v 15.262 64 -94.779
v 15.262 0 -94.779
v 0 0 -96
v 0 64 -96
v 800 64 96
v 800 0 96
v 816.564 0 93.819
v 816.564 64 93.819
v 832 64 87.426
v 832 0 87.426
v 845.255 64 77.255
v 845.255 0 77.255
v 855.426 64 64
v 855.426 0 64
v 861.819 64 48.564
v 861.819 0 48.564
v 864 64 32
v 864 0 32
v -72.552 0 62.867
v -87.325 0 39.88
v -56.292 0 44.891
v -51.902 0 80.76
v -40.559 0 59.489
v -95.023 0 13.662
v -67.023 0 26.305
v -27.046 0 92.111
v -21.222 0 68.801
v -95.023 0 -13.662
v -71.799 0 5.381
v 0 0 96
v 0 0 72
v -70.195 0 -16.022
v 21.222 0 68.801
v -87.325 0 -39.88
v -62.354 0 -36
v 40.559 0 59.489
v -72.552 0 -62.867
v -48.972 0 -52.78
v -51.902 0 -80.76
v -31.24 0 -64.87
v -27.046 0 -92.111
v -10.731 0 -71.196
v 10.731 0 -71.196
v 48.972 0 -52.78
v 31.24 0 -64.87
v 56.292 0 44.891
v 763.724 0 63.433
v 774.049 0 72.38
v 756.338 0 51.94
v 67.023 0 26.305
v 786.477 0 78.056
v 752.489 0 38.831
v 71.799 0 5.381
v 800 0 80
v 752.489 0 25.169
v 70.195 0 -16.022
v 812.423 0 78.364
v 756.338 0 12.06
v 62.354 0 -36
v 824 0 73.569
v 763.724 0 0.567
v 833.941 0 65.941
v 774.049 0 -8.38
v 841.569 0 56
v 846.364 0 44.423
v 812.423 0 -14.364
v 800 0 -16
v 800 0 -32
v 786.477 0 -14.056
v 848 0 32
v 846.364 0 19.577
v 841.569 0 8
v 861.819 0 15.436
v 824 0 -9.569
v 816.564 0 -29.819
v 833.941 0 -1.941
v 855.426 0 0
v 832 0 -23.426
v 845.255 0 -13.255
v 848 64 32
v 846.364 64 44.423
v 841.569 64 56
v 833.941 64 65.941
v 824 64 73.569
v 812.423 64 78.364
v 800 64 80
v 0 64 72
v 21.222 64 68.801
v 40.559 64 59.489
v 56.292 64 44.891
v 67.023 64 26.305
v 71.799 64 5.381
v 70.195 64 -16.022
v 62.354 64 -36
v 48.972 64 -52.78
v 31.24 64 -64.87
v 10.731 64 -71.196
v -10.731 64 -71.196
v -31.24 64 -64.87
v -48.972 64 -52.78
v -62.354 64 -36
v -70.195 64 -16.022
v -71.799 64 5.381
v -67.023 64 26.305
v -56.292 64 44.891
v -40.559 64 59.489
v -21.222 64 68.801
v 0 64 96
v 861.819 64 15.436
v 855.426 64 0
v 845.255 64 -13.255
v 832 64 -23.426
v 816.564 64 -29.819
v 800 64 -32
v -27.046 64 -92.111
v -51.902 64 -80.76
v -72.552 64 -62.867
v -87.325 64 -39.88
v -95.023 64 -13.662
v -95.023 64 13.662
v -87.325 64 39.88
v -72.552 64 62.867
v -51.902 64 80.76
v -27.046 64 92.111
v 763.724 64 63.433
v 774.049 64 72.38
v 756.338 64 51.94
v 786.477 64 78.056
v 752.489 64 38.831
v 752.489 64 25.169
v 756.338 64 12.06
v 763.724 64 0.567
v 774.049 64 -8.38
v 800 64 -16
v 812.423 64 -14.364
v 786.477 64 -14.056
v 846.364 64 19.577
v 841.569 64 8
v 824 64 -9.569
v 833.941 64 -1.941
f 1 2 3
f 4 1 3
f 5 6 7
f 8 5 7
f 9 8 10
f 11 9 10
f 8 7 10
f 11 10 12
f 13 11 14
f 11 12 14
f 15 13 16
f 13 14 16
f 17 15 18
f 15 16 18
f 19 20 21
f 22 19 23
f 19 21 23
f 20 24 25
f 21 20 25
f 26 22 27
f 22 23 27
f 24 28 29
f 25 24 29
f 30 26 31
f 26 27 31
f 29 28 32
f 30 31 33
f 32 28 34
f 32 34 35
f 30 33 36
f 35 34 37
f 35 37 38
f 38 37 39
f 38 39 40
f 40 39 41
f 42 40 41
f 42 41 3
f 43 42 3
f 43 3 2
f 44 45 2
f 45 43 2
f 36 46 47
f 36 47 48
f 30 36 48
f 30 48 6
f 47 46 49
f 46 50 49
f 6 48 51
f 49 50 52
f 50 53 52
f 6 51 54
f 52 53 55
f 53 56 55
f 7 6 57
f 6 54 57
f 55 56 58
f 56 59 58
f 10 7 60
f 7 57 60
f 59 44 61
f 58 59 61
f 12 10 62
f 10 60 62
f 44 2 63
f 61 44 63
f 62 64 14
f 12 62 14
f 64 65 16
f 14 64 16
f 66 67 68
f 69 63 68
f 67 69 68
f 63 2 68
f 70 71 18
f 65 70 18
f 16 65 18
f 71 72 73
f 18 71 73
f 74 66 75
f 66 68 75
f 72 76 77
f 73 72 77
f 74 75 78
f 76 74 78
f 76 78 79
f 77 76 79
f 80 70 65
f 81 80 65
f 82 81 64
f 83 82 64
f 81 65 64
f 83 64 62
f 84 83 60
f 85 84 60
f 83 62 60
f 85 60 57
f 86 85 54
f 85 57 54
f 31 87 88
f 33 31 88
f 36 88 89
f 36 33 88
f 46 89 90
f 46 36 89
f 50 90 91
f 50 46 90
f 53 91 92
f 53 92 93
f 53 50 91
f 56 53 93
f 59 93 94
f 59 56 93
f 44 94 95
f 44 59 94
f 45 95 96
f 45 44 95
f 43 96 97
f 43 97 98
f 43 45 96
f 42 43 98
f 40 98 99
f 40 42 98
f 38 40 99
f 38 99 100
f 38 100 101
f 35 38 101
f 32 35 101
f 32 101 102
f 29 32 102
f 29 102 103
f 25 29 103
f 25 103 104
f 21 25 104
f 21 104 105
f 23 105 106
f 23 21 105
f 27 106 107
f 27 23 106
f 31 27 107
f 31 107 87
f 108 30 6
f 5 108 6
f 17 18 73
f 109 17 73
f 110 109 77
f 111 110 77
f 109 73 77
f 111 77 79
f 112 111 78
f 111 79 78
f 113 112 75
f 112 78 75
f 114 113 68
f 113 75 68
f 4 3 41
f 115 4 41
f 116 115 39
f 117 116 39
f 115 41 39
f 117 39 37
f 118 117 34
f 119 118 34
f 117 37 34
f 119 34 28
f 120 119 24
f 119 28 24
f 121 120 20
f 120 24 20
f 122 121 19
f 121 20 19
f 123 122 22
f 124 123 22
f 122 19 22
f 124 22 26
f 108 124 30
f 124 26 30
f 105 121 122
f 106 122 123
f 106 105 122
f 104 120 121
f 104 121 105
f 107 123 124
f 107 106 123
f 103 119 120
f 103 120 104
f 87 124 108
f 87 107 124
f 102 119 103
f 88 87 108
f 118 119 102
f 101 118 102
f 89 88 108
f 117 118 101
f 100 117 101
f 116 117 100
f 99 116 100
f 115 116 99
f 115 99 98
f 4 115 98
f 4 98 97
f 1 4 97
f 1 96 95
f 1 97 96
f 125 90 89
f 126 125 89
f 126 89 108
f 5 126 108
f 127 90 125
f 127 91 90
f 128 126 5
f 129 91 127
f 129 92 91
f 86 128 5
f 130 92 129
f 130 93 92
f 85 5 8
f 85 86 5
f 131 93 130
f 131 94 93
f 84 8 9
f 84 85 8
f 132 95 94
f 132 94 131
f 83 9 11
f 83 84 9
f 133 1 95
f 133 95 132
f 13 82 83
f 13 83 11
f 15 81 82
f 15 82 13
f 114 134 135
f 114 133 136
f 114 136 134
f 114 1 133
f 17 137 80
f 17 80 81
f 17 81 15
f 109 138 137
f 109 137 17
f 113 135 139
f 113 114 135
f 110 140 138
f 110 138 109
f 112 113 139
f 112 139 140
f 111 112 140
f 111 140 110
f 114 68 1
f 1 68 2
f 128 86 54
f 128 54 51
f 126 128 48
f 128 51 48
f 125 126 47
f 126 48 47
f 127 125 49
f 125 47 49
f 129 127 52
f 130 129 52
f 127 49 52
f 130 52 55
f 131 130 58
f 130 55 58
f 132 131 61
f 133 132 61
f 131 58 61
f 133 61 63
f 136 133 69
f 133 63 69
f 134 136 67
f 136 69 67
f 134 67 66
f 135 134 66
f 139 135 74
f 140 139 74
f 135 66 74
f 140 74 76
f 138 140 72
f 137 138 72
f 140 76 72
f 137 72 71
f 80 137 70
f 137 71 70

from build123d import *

# Parameters (mm, degrees)
SKETCH1_R           = 72
BOSS_EXTRUDE2_DEPTH = 64


with BuildPart() as part:
    # Sketch1 → Boss-Extrude2 (new body)
    # profile 1 of 6: a face of its own
    with BuildSketch(Plane(origin=(0, 0, 0), x_dir=(1, 0, 0), z_dir=(0, 1, 0))):
        with BuildLine():
            ThreePointArc((0, 96), (-96, 0), (0, -96))
            ThreePointArc((0, -96), (67.882250994, -67.882250994), (96, 0))
            ThreePointArc((96, 0), (73.079350127, 62.252779738), (15.262321145, 94.779014308))
            Line((15.262321145, 94.779014308), (0, 96))
        make_face()
        with Locations(Location((0, 0, 0), (0, 0, 270))):
            Circle(SKETCH1_R, mode=Mode.SUBTRACT)
    # profile 2 of 6: a face of its own
    with BuildSketch(Plane(origin=(0, 0, 0), x_dir=(1, 0, 0), z_dir=(0, 1, 0))):
        with BuildLine():
            ThreePointArc((96, 0), (67.882250994, -67.882250994), (0, -96))
            Line((0, -96), (800, -96))
            ThreePointArc((800, -96), (736, -32), (800, 32))
            Line((800, 32), (15.262321145, 94.779014308))
            ThreePointArc((15.262321145, 94.779014308), (73.079350127, 62.252779738), (96, 0))
        make_face()
    # profile 3 of 6: a face of its own
    with BuildSketch(Plane(origin=(0, 0, 0), x_dir=(1, 0, 0), z_dir=(0, 1, 0))):
        with BuildLine():
            ThreePointArc((800, 32), (736, -32), (800, -96))
            Line((800, -96), (800, -80))
            ThreePointArc((800, -80), (752, -32), (800, 16))
            Line((800, 16), (800, 32))
        make_face()
    # profile 4 of 6: a face of its own
    with BuildSketch(Plane(origin=(0, 0, 0), x_dir=(1, 0, 0), z_dir=(0, 1, 0))):
        with BuildLine():
            Line((800, -80), (800, -96))
            ThreePointArc((800, -96), (845.254833996, -77.254833996), (864, -32))
            ThreePointArc((864, -32), (845.254833996, 13.254833996), (800, 32))
            Line((800, 32), (800, 16))
            ThreePointArc((800, 16), (833.941125497, 1.941125497), (848, -32))
            ThreePointArc((848, -32), (833.941125497, -65.941125497), (800, -80))
        make_face()
    # profile 5 of 6: a face of its own
    with BuildSketch(Plane(origin=(0, 0, 0), x_dir=(1, 0, 0), z_dir=(0, 1, 0))):
        with BuildLine():
            ThreePointArc((800, 32), (736, -32), (800, -96))
            Line((800, -96), (800, -80))
            ThreePointArc((800, -80), (752, -32), (800, 16))
            Line((800, 16), (800, 32))
        make_face()
    # profile 6 of 6: a face of its own
    with BuildSketch(Plane(origin=(0, 0, 0), x_dir=(1, 0, 0), z_dir=(0, 1, 0))):
        with BuildLine():
            Line((800, -80), (800, -96))
            ThreePointArc((800, -96), (845.254833996, -77.254833996), (864, -32))
            ThreePointArc((864, -32), (845.254833996, 13.254833996), (800, 32))
            Line((800, 32), (800, 16))
            ThreePointArc((800, 16), (833.941125497, 1.941125497), (848, -32))
            ThreePointArc((848, -32), (833.941125497, -65.941125497), (800, -80))
        make_face()
    extrude(amount=BOSS_EXTRUDE2_DEPTH)


solid = part.part
